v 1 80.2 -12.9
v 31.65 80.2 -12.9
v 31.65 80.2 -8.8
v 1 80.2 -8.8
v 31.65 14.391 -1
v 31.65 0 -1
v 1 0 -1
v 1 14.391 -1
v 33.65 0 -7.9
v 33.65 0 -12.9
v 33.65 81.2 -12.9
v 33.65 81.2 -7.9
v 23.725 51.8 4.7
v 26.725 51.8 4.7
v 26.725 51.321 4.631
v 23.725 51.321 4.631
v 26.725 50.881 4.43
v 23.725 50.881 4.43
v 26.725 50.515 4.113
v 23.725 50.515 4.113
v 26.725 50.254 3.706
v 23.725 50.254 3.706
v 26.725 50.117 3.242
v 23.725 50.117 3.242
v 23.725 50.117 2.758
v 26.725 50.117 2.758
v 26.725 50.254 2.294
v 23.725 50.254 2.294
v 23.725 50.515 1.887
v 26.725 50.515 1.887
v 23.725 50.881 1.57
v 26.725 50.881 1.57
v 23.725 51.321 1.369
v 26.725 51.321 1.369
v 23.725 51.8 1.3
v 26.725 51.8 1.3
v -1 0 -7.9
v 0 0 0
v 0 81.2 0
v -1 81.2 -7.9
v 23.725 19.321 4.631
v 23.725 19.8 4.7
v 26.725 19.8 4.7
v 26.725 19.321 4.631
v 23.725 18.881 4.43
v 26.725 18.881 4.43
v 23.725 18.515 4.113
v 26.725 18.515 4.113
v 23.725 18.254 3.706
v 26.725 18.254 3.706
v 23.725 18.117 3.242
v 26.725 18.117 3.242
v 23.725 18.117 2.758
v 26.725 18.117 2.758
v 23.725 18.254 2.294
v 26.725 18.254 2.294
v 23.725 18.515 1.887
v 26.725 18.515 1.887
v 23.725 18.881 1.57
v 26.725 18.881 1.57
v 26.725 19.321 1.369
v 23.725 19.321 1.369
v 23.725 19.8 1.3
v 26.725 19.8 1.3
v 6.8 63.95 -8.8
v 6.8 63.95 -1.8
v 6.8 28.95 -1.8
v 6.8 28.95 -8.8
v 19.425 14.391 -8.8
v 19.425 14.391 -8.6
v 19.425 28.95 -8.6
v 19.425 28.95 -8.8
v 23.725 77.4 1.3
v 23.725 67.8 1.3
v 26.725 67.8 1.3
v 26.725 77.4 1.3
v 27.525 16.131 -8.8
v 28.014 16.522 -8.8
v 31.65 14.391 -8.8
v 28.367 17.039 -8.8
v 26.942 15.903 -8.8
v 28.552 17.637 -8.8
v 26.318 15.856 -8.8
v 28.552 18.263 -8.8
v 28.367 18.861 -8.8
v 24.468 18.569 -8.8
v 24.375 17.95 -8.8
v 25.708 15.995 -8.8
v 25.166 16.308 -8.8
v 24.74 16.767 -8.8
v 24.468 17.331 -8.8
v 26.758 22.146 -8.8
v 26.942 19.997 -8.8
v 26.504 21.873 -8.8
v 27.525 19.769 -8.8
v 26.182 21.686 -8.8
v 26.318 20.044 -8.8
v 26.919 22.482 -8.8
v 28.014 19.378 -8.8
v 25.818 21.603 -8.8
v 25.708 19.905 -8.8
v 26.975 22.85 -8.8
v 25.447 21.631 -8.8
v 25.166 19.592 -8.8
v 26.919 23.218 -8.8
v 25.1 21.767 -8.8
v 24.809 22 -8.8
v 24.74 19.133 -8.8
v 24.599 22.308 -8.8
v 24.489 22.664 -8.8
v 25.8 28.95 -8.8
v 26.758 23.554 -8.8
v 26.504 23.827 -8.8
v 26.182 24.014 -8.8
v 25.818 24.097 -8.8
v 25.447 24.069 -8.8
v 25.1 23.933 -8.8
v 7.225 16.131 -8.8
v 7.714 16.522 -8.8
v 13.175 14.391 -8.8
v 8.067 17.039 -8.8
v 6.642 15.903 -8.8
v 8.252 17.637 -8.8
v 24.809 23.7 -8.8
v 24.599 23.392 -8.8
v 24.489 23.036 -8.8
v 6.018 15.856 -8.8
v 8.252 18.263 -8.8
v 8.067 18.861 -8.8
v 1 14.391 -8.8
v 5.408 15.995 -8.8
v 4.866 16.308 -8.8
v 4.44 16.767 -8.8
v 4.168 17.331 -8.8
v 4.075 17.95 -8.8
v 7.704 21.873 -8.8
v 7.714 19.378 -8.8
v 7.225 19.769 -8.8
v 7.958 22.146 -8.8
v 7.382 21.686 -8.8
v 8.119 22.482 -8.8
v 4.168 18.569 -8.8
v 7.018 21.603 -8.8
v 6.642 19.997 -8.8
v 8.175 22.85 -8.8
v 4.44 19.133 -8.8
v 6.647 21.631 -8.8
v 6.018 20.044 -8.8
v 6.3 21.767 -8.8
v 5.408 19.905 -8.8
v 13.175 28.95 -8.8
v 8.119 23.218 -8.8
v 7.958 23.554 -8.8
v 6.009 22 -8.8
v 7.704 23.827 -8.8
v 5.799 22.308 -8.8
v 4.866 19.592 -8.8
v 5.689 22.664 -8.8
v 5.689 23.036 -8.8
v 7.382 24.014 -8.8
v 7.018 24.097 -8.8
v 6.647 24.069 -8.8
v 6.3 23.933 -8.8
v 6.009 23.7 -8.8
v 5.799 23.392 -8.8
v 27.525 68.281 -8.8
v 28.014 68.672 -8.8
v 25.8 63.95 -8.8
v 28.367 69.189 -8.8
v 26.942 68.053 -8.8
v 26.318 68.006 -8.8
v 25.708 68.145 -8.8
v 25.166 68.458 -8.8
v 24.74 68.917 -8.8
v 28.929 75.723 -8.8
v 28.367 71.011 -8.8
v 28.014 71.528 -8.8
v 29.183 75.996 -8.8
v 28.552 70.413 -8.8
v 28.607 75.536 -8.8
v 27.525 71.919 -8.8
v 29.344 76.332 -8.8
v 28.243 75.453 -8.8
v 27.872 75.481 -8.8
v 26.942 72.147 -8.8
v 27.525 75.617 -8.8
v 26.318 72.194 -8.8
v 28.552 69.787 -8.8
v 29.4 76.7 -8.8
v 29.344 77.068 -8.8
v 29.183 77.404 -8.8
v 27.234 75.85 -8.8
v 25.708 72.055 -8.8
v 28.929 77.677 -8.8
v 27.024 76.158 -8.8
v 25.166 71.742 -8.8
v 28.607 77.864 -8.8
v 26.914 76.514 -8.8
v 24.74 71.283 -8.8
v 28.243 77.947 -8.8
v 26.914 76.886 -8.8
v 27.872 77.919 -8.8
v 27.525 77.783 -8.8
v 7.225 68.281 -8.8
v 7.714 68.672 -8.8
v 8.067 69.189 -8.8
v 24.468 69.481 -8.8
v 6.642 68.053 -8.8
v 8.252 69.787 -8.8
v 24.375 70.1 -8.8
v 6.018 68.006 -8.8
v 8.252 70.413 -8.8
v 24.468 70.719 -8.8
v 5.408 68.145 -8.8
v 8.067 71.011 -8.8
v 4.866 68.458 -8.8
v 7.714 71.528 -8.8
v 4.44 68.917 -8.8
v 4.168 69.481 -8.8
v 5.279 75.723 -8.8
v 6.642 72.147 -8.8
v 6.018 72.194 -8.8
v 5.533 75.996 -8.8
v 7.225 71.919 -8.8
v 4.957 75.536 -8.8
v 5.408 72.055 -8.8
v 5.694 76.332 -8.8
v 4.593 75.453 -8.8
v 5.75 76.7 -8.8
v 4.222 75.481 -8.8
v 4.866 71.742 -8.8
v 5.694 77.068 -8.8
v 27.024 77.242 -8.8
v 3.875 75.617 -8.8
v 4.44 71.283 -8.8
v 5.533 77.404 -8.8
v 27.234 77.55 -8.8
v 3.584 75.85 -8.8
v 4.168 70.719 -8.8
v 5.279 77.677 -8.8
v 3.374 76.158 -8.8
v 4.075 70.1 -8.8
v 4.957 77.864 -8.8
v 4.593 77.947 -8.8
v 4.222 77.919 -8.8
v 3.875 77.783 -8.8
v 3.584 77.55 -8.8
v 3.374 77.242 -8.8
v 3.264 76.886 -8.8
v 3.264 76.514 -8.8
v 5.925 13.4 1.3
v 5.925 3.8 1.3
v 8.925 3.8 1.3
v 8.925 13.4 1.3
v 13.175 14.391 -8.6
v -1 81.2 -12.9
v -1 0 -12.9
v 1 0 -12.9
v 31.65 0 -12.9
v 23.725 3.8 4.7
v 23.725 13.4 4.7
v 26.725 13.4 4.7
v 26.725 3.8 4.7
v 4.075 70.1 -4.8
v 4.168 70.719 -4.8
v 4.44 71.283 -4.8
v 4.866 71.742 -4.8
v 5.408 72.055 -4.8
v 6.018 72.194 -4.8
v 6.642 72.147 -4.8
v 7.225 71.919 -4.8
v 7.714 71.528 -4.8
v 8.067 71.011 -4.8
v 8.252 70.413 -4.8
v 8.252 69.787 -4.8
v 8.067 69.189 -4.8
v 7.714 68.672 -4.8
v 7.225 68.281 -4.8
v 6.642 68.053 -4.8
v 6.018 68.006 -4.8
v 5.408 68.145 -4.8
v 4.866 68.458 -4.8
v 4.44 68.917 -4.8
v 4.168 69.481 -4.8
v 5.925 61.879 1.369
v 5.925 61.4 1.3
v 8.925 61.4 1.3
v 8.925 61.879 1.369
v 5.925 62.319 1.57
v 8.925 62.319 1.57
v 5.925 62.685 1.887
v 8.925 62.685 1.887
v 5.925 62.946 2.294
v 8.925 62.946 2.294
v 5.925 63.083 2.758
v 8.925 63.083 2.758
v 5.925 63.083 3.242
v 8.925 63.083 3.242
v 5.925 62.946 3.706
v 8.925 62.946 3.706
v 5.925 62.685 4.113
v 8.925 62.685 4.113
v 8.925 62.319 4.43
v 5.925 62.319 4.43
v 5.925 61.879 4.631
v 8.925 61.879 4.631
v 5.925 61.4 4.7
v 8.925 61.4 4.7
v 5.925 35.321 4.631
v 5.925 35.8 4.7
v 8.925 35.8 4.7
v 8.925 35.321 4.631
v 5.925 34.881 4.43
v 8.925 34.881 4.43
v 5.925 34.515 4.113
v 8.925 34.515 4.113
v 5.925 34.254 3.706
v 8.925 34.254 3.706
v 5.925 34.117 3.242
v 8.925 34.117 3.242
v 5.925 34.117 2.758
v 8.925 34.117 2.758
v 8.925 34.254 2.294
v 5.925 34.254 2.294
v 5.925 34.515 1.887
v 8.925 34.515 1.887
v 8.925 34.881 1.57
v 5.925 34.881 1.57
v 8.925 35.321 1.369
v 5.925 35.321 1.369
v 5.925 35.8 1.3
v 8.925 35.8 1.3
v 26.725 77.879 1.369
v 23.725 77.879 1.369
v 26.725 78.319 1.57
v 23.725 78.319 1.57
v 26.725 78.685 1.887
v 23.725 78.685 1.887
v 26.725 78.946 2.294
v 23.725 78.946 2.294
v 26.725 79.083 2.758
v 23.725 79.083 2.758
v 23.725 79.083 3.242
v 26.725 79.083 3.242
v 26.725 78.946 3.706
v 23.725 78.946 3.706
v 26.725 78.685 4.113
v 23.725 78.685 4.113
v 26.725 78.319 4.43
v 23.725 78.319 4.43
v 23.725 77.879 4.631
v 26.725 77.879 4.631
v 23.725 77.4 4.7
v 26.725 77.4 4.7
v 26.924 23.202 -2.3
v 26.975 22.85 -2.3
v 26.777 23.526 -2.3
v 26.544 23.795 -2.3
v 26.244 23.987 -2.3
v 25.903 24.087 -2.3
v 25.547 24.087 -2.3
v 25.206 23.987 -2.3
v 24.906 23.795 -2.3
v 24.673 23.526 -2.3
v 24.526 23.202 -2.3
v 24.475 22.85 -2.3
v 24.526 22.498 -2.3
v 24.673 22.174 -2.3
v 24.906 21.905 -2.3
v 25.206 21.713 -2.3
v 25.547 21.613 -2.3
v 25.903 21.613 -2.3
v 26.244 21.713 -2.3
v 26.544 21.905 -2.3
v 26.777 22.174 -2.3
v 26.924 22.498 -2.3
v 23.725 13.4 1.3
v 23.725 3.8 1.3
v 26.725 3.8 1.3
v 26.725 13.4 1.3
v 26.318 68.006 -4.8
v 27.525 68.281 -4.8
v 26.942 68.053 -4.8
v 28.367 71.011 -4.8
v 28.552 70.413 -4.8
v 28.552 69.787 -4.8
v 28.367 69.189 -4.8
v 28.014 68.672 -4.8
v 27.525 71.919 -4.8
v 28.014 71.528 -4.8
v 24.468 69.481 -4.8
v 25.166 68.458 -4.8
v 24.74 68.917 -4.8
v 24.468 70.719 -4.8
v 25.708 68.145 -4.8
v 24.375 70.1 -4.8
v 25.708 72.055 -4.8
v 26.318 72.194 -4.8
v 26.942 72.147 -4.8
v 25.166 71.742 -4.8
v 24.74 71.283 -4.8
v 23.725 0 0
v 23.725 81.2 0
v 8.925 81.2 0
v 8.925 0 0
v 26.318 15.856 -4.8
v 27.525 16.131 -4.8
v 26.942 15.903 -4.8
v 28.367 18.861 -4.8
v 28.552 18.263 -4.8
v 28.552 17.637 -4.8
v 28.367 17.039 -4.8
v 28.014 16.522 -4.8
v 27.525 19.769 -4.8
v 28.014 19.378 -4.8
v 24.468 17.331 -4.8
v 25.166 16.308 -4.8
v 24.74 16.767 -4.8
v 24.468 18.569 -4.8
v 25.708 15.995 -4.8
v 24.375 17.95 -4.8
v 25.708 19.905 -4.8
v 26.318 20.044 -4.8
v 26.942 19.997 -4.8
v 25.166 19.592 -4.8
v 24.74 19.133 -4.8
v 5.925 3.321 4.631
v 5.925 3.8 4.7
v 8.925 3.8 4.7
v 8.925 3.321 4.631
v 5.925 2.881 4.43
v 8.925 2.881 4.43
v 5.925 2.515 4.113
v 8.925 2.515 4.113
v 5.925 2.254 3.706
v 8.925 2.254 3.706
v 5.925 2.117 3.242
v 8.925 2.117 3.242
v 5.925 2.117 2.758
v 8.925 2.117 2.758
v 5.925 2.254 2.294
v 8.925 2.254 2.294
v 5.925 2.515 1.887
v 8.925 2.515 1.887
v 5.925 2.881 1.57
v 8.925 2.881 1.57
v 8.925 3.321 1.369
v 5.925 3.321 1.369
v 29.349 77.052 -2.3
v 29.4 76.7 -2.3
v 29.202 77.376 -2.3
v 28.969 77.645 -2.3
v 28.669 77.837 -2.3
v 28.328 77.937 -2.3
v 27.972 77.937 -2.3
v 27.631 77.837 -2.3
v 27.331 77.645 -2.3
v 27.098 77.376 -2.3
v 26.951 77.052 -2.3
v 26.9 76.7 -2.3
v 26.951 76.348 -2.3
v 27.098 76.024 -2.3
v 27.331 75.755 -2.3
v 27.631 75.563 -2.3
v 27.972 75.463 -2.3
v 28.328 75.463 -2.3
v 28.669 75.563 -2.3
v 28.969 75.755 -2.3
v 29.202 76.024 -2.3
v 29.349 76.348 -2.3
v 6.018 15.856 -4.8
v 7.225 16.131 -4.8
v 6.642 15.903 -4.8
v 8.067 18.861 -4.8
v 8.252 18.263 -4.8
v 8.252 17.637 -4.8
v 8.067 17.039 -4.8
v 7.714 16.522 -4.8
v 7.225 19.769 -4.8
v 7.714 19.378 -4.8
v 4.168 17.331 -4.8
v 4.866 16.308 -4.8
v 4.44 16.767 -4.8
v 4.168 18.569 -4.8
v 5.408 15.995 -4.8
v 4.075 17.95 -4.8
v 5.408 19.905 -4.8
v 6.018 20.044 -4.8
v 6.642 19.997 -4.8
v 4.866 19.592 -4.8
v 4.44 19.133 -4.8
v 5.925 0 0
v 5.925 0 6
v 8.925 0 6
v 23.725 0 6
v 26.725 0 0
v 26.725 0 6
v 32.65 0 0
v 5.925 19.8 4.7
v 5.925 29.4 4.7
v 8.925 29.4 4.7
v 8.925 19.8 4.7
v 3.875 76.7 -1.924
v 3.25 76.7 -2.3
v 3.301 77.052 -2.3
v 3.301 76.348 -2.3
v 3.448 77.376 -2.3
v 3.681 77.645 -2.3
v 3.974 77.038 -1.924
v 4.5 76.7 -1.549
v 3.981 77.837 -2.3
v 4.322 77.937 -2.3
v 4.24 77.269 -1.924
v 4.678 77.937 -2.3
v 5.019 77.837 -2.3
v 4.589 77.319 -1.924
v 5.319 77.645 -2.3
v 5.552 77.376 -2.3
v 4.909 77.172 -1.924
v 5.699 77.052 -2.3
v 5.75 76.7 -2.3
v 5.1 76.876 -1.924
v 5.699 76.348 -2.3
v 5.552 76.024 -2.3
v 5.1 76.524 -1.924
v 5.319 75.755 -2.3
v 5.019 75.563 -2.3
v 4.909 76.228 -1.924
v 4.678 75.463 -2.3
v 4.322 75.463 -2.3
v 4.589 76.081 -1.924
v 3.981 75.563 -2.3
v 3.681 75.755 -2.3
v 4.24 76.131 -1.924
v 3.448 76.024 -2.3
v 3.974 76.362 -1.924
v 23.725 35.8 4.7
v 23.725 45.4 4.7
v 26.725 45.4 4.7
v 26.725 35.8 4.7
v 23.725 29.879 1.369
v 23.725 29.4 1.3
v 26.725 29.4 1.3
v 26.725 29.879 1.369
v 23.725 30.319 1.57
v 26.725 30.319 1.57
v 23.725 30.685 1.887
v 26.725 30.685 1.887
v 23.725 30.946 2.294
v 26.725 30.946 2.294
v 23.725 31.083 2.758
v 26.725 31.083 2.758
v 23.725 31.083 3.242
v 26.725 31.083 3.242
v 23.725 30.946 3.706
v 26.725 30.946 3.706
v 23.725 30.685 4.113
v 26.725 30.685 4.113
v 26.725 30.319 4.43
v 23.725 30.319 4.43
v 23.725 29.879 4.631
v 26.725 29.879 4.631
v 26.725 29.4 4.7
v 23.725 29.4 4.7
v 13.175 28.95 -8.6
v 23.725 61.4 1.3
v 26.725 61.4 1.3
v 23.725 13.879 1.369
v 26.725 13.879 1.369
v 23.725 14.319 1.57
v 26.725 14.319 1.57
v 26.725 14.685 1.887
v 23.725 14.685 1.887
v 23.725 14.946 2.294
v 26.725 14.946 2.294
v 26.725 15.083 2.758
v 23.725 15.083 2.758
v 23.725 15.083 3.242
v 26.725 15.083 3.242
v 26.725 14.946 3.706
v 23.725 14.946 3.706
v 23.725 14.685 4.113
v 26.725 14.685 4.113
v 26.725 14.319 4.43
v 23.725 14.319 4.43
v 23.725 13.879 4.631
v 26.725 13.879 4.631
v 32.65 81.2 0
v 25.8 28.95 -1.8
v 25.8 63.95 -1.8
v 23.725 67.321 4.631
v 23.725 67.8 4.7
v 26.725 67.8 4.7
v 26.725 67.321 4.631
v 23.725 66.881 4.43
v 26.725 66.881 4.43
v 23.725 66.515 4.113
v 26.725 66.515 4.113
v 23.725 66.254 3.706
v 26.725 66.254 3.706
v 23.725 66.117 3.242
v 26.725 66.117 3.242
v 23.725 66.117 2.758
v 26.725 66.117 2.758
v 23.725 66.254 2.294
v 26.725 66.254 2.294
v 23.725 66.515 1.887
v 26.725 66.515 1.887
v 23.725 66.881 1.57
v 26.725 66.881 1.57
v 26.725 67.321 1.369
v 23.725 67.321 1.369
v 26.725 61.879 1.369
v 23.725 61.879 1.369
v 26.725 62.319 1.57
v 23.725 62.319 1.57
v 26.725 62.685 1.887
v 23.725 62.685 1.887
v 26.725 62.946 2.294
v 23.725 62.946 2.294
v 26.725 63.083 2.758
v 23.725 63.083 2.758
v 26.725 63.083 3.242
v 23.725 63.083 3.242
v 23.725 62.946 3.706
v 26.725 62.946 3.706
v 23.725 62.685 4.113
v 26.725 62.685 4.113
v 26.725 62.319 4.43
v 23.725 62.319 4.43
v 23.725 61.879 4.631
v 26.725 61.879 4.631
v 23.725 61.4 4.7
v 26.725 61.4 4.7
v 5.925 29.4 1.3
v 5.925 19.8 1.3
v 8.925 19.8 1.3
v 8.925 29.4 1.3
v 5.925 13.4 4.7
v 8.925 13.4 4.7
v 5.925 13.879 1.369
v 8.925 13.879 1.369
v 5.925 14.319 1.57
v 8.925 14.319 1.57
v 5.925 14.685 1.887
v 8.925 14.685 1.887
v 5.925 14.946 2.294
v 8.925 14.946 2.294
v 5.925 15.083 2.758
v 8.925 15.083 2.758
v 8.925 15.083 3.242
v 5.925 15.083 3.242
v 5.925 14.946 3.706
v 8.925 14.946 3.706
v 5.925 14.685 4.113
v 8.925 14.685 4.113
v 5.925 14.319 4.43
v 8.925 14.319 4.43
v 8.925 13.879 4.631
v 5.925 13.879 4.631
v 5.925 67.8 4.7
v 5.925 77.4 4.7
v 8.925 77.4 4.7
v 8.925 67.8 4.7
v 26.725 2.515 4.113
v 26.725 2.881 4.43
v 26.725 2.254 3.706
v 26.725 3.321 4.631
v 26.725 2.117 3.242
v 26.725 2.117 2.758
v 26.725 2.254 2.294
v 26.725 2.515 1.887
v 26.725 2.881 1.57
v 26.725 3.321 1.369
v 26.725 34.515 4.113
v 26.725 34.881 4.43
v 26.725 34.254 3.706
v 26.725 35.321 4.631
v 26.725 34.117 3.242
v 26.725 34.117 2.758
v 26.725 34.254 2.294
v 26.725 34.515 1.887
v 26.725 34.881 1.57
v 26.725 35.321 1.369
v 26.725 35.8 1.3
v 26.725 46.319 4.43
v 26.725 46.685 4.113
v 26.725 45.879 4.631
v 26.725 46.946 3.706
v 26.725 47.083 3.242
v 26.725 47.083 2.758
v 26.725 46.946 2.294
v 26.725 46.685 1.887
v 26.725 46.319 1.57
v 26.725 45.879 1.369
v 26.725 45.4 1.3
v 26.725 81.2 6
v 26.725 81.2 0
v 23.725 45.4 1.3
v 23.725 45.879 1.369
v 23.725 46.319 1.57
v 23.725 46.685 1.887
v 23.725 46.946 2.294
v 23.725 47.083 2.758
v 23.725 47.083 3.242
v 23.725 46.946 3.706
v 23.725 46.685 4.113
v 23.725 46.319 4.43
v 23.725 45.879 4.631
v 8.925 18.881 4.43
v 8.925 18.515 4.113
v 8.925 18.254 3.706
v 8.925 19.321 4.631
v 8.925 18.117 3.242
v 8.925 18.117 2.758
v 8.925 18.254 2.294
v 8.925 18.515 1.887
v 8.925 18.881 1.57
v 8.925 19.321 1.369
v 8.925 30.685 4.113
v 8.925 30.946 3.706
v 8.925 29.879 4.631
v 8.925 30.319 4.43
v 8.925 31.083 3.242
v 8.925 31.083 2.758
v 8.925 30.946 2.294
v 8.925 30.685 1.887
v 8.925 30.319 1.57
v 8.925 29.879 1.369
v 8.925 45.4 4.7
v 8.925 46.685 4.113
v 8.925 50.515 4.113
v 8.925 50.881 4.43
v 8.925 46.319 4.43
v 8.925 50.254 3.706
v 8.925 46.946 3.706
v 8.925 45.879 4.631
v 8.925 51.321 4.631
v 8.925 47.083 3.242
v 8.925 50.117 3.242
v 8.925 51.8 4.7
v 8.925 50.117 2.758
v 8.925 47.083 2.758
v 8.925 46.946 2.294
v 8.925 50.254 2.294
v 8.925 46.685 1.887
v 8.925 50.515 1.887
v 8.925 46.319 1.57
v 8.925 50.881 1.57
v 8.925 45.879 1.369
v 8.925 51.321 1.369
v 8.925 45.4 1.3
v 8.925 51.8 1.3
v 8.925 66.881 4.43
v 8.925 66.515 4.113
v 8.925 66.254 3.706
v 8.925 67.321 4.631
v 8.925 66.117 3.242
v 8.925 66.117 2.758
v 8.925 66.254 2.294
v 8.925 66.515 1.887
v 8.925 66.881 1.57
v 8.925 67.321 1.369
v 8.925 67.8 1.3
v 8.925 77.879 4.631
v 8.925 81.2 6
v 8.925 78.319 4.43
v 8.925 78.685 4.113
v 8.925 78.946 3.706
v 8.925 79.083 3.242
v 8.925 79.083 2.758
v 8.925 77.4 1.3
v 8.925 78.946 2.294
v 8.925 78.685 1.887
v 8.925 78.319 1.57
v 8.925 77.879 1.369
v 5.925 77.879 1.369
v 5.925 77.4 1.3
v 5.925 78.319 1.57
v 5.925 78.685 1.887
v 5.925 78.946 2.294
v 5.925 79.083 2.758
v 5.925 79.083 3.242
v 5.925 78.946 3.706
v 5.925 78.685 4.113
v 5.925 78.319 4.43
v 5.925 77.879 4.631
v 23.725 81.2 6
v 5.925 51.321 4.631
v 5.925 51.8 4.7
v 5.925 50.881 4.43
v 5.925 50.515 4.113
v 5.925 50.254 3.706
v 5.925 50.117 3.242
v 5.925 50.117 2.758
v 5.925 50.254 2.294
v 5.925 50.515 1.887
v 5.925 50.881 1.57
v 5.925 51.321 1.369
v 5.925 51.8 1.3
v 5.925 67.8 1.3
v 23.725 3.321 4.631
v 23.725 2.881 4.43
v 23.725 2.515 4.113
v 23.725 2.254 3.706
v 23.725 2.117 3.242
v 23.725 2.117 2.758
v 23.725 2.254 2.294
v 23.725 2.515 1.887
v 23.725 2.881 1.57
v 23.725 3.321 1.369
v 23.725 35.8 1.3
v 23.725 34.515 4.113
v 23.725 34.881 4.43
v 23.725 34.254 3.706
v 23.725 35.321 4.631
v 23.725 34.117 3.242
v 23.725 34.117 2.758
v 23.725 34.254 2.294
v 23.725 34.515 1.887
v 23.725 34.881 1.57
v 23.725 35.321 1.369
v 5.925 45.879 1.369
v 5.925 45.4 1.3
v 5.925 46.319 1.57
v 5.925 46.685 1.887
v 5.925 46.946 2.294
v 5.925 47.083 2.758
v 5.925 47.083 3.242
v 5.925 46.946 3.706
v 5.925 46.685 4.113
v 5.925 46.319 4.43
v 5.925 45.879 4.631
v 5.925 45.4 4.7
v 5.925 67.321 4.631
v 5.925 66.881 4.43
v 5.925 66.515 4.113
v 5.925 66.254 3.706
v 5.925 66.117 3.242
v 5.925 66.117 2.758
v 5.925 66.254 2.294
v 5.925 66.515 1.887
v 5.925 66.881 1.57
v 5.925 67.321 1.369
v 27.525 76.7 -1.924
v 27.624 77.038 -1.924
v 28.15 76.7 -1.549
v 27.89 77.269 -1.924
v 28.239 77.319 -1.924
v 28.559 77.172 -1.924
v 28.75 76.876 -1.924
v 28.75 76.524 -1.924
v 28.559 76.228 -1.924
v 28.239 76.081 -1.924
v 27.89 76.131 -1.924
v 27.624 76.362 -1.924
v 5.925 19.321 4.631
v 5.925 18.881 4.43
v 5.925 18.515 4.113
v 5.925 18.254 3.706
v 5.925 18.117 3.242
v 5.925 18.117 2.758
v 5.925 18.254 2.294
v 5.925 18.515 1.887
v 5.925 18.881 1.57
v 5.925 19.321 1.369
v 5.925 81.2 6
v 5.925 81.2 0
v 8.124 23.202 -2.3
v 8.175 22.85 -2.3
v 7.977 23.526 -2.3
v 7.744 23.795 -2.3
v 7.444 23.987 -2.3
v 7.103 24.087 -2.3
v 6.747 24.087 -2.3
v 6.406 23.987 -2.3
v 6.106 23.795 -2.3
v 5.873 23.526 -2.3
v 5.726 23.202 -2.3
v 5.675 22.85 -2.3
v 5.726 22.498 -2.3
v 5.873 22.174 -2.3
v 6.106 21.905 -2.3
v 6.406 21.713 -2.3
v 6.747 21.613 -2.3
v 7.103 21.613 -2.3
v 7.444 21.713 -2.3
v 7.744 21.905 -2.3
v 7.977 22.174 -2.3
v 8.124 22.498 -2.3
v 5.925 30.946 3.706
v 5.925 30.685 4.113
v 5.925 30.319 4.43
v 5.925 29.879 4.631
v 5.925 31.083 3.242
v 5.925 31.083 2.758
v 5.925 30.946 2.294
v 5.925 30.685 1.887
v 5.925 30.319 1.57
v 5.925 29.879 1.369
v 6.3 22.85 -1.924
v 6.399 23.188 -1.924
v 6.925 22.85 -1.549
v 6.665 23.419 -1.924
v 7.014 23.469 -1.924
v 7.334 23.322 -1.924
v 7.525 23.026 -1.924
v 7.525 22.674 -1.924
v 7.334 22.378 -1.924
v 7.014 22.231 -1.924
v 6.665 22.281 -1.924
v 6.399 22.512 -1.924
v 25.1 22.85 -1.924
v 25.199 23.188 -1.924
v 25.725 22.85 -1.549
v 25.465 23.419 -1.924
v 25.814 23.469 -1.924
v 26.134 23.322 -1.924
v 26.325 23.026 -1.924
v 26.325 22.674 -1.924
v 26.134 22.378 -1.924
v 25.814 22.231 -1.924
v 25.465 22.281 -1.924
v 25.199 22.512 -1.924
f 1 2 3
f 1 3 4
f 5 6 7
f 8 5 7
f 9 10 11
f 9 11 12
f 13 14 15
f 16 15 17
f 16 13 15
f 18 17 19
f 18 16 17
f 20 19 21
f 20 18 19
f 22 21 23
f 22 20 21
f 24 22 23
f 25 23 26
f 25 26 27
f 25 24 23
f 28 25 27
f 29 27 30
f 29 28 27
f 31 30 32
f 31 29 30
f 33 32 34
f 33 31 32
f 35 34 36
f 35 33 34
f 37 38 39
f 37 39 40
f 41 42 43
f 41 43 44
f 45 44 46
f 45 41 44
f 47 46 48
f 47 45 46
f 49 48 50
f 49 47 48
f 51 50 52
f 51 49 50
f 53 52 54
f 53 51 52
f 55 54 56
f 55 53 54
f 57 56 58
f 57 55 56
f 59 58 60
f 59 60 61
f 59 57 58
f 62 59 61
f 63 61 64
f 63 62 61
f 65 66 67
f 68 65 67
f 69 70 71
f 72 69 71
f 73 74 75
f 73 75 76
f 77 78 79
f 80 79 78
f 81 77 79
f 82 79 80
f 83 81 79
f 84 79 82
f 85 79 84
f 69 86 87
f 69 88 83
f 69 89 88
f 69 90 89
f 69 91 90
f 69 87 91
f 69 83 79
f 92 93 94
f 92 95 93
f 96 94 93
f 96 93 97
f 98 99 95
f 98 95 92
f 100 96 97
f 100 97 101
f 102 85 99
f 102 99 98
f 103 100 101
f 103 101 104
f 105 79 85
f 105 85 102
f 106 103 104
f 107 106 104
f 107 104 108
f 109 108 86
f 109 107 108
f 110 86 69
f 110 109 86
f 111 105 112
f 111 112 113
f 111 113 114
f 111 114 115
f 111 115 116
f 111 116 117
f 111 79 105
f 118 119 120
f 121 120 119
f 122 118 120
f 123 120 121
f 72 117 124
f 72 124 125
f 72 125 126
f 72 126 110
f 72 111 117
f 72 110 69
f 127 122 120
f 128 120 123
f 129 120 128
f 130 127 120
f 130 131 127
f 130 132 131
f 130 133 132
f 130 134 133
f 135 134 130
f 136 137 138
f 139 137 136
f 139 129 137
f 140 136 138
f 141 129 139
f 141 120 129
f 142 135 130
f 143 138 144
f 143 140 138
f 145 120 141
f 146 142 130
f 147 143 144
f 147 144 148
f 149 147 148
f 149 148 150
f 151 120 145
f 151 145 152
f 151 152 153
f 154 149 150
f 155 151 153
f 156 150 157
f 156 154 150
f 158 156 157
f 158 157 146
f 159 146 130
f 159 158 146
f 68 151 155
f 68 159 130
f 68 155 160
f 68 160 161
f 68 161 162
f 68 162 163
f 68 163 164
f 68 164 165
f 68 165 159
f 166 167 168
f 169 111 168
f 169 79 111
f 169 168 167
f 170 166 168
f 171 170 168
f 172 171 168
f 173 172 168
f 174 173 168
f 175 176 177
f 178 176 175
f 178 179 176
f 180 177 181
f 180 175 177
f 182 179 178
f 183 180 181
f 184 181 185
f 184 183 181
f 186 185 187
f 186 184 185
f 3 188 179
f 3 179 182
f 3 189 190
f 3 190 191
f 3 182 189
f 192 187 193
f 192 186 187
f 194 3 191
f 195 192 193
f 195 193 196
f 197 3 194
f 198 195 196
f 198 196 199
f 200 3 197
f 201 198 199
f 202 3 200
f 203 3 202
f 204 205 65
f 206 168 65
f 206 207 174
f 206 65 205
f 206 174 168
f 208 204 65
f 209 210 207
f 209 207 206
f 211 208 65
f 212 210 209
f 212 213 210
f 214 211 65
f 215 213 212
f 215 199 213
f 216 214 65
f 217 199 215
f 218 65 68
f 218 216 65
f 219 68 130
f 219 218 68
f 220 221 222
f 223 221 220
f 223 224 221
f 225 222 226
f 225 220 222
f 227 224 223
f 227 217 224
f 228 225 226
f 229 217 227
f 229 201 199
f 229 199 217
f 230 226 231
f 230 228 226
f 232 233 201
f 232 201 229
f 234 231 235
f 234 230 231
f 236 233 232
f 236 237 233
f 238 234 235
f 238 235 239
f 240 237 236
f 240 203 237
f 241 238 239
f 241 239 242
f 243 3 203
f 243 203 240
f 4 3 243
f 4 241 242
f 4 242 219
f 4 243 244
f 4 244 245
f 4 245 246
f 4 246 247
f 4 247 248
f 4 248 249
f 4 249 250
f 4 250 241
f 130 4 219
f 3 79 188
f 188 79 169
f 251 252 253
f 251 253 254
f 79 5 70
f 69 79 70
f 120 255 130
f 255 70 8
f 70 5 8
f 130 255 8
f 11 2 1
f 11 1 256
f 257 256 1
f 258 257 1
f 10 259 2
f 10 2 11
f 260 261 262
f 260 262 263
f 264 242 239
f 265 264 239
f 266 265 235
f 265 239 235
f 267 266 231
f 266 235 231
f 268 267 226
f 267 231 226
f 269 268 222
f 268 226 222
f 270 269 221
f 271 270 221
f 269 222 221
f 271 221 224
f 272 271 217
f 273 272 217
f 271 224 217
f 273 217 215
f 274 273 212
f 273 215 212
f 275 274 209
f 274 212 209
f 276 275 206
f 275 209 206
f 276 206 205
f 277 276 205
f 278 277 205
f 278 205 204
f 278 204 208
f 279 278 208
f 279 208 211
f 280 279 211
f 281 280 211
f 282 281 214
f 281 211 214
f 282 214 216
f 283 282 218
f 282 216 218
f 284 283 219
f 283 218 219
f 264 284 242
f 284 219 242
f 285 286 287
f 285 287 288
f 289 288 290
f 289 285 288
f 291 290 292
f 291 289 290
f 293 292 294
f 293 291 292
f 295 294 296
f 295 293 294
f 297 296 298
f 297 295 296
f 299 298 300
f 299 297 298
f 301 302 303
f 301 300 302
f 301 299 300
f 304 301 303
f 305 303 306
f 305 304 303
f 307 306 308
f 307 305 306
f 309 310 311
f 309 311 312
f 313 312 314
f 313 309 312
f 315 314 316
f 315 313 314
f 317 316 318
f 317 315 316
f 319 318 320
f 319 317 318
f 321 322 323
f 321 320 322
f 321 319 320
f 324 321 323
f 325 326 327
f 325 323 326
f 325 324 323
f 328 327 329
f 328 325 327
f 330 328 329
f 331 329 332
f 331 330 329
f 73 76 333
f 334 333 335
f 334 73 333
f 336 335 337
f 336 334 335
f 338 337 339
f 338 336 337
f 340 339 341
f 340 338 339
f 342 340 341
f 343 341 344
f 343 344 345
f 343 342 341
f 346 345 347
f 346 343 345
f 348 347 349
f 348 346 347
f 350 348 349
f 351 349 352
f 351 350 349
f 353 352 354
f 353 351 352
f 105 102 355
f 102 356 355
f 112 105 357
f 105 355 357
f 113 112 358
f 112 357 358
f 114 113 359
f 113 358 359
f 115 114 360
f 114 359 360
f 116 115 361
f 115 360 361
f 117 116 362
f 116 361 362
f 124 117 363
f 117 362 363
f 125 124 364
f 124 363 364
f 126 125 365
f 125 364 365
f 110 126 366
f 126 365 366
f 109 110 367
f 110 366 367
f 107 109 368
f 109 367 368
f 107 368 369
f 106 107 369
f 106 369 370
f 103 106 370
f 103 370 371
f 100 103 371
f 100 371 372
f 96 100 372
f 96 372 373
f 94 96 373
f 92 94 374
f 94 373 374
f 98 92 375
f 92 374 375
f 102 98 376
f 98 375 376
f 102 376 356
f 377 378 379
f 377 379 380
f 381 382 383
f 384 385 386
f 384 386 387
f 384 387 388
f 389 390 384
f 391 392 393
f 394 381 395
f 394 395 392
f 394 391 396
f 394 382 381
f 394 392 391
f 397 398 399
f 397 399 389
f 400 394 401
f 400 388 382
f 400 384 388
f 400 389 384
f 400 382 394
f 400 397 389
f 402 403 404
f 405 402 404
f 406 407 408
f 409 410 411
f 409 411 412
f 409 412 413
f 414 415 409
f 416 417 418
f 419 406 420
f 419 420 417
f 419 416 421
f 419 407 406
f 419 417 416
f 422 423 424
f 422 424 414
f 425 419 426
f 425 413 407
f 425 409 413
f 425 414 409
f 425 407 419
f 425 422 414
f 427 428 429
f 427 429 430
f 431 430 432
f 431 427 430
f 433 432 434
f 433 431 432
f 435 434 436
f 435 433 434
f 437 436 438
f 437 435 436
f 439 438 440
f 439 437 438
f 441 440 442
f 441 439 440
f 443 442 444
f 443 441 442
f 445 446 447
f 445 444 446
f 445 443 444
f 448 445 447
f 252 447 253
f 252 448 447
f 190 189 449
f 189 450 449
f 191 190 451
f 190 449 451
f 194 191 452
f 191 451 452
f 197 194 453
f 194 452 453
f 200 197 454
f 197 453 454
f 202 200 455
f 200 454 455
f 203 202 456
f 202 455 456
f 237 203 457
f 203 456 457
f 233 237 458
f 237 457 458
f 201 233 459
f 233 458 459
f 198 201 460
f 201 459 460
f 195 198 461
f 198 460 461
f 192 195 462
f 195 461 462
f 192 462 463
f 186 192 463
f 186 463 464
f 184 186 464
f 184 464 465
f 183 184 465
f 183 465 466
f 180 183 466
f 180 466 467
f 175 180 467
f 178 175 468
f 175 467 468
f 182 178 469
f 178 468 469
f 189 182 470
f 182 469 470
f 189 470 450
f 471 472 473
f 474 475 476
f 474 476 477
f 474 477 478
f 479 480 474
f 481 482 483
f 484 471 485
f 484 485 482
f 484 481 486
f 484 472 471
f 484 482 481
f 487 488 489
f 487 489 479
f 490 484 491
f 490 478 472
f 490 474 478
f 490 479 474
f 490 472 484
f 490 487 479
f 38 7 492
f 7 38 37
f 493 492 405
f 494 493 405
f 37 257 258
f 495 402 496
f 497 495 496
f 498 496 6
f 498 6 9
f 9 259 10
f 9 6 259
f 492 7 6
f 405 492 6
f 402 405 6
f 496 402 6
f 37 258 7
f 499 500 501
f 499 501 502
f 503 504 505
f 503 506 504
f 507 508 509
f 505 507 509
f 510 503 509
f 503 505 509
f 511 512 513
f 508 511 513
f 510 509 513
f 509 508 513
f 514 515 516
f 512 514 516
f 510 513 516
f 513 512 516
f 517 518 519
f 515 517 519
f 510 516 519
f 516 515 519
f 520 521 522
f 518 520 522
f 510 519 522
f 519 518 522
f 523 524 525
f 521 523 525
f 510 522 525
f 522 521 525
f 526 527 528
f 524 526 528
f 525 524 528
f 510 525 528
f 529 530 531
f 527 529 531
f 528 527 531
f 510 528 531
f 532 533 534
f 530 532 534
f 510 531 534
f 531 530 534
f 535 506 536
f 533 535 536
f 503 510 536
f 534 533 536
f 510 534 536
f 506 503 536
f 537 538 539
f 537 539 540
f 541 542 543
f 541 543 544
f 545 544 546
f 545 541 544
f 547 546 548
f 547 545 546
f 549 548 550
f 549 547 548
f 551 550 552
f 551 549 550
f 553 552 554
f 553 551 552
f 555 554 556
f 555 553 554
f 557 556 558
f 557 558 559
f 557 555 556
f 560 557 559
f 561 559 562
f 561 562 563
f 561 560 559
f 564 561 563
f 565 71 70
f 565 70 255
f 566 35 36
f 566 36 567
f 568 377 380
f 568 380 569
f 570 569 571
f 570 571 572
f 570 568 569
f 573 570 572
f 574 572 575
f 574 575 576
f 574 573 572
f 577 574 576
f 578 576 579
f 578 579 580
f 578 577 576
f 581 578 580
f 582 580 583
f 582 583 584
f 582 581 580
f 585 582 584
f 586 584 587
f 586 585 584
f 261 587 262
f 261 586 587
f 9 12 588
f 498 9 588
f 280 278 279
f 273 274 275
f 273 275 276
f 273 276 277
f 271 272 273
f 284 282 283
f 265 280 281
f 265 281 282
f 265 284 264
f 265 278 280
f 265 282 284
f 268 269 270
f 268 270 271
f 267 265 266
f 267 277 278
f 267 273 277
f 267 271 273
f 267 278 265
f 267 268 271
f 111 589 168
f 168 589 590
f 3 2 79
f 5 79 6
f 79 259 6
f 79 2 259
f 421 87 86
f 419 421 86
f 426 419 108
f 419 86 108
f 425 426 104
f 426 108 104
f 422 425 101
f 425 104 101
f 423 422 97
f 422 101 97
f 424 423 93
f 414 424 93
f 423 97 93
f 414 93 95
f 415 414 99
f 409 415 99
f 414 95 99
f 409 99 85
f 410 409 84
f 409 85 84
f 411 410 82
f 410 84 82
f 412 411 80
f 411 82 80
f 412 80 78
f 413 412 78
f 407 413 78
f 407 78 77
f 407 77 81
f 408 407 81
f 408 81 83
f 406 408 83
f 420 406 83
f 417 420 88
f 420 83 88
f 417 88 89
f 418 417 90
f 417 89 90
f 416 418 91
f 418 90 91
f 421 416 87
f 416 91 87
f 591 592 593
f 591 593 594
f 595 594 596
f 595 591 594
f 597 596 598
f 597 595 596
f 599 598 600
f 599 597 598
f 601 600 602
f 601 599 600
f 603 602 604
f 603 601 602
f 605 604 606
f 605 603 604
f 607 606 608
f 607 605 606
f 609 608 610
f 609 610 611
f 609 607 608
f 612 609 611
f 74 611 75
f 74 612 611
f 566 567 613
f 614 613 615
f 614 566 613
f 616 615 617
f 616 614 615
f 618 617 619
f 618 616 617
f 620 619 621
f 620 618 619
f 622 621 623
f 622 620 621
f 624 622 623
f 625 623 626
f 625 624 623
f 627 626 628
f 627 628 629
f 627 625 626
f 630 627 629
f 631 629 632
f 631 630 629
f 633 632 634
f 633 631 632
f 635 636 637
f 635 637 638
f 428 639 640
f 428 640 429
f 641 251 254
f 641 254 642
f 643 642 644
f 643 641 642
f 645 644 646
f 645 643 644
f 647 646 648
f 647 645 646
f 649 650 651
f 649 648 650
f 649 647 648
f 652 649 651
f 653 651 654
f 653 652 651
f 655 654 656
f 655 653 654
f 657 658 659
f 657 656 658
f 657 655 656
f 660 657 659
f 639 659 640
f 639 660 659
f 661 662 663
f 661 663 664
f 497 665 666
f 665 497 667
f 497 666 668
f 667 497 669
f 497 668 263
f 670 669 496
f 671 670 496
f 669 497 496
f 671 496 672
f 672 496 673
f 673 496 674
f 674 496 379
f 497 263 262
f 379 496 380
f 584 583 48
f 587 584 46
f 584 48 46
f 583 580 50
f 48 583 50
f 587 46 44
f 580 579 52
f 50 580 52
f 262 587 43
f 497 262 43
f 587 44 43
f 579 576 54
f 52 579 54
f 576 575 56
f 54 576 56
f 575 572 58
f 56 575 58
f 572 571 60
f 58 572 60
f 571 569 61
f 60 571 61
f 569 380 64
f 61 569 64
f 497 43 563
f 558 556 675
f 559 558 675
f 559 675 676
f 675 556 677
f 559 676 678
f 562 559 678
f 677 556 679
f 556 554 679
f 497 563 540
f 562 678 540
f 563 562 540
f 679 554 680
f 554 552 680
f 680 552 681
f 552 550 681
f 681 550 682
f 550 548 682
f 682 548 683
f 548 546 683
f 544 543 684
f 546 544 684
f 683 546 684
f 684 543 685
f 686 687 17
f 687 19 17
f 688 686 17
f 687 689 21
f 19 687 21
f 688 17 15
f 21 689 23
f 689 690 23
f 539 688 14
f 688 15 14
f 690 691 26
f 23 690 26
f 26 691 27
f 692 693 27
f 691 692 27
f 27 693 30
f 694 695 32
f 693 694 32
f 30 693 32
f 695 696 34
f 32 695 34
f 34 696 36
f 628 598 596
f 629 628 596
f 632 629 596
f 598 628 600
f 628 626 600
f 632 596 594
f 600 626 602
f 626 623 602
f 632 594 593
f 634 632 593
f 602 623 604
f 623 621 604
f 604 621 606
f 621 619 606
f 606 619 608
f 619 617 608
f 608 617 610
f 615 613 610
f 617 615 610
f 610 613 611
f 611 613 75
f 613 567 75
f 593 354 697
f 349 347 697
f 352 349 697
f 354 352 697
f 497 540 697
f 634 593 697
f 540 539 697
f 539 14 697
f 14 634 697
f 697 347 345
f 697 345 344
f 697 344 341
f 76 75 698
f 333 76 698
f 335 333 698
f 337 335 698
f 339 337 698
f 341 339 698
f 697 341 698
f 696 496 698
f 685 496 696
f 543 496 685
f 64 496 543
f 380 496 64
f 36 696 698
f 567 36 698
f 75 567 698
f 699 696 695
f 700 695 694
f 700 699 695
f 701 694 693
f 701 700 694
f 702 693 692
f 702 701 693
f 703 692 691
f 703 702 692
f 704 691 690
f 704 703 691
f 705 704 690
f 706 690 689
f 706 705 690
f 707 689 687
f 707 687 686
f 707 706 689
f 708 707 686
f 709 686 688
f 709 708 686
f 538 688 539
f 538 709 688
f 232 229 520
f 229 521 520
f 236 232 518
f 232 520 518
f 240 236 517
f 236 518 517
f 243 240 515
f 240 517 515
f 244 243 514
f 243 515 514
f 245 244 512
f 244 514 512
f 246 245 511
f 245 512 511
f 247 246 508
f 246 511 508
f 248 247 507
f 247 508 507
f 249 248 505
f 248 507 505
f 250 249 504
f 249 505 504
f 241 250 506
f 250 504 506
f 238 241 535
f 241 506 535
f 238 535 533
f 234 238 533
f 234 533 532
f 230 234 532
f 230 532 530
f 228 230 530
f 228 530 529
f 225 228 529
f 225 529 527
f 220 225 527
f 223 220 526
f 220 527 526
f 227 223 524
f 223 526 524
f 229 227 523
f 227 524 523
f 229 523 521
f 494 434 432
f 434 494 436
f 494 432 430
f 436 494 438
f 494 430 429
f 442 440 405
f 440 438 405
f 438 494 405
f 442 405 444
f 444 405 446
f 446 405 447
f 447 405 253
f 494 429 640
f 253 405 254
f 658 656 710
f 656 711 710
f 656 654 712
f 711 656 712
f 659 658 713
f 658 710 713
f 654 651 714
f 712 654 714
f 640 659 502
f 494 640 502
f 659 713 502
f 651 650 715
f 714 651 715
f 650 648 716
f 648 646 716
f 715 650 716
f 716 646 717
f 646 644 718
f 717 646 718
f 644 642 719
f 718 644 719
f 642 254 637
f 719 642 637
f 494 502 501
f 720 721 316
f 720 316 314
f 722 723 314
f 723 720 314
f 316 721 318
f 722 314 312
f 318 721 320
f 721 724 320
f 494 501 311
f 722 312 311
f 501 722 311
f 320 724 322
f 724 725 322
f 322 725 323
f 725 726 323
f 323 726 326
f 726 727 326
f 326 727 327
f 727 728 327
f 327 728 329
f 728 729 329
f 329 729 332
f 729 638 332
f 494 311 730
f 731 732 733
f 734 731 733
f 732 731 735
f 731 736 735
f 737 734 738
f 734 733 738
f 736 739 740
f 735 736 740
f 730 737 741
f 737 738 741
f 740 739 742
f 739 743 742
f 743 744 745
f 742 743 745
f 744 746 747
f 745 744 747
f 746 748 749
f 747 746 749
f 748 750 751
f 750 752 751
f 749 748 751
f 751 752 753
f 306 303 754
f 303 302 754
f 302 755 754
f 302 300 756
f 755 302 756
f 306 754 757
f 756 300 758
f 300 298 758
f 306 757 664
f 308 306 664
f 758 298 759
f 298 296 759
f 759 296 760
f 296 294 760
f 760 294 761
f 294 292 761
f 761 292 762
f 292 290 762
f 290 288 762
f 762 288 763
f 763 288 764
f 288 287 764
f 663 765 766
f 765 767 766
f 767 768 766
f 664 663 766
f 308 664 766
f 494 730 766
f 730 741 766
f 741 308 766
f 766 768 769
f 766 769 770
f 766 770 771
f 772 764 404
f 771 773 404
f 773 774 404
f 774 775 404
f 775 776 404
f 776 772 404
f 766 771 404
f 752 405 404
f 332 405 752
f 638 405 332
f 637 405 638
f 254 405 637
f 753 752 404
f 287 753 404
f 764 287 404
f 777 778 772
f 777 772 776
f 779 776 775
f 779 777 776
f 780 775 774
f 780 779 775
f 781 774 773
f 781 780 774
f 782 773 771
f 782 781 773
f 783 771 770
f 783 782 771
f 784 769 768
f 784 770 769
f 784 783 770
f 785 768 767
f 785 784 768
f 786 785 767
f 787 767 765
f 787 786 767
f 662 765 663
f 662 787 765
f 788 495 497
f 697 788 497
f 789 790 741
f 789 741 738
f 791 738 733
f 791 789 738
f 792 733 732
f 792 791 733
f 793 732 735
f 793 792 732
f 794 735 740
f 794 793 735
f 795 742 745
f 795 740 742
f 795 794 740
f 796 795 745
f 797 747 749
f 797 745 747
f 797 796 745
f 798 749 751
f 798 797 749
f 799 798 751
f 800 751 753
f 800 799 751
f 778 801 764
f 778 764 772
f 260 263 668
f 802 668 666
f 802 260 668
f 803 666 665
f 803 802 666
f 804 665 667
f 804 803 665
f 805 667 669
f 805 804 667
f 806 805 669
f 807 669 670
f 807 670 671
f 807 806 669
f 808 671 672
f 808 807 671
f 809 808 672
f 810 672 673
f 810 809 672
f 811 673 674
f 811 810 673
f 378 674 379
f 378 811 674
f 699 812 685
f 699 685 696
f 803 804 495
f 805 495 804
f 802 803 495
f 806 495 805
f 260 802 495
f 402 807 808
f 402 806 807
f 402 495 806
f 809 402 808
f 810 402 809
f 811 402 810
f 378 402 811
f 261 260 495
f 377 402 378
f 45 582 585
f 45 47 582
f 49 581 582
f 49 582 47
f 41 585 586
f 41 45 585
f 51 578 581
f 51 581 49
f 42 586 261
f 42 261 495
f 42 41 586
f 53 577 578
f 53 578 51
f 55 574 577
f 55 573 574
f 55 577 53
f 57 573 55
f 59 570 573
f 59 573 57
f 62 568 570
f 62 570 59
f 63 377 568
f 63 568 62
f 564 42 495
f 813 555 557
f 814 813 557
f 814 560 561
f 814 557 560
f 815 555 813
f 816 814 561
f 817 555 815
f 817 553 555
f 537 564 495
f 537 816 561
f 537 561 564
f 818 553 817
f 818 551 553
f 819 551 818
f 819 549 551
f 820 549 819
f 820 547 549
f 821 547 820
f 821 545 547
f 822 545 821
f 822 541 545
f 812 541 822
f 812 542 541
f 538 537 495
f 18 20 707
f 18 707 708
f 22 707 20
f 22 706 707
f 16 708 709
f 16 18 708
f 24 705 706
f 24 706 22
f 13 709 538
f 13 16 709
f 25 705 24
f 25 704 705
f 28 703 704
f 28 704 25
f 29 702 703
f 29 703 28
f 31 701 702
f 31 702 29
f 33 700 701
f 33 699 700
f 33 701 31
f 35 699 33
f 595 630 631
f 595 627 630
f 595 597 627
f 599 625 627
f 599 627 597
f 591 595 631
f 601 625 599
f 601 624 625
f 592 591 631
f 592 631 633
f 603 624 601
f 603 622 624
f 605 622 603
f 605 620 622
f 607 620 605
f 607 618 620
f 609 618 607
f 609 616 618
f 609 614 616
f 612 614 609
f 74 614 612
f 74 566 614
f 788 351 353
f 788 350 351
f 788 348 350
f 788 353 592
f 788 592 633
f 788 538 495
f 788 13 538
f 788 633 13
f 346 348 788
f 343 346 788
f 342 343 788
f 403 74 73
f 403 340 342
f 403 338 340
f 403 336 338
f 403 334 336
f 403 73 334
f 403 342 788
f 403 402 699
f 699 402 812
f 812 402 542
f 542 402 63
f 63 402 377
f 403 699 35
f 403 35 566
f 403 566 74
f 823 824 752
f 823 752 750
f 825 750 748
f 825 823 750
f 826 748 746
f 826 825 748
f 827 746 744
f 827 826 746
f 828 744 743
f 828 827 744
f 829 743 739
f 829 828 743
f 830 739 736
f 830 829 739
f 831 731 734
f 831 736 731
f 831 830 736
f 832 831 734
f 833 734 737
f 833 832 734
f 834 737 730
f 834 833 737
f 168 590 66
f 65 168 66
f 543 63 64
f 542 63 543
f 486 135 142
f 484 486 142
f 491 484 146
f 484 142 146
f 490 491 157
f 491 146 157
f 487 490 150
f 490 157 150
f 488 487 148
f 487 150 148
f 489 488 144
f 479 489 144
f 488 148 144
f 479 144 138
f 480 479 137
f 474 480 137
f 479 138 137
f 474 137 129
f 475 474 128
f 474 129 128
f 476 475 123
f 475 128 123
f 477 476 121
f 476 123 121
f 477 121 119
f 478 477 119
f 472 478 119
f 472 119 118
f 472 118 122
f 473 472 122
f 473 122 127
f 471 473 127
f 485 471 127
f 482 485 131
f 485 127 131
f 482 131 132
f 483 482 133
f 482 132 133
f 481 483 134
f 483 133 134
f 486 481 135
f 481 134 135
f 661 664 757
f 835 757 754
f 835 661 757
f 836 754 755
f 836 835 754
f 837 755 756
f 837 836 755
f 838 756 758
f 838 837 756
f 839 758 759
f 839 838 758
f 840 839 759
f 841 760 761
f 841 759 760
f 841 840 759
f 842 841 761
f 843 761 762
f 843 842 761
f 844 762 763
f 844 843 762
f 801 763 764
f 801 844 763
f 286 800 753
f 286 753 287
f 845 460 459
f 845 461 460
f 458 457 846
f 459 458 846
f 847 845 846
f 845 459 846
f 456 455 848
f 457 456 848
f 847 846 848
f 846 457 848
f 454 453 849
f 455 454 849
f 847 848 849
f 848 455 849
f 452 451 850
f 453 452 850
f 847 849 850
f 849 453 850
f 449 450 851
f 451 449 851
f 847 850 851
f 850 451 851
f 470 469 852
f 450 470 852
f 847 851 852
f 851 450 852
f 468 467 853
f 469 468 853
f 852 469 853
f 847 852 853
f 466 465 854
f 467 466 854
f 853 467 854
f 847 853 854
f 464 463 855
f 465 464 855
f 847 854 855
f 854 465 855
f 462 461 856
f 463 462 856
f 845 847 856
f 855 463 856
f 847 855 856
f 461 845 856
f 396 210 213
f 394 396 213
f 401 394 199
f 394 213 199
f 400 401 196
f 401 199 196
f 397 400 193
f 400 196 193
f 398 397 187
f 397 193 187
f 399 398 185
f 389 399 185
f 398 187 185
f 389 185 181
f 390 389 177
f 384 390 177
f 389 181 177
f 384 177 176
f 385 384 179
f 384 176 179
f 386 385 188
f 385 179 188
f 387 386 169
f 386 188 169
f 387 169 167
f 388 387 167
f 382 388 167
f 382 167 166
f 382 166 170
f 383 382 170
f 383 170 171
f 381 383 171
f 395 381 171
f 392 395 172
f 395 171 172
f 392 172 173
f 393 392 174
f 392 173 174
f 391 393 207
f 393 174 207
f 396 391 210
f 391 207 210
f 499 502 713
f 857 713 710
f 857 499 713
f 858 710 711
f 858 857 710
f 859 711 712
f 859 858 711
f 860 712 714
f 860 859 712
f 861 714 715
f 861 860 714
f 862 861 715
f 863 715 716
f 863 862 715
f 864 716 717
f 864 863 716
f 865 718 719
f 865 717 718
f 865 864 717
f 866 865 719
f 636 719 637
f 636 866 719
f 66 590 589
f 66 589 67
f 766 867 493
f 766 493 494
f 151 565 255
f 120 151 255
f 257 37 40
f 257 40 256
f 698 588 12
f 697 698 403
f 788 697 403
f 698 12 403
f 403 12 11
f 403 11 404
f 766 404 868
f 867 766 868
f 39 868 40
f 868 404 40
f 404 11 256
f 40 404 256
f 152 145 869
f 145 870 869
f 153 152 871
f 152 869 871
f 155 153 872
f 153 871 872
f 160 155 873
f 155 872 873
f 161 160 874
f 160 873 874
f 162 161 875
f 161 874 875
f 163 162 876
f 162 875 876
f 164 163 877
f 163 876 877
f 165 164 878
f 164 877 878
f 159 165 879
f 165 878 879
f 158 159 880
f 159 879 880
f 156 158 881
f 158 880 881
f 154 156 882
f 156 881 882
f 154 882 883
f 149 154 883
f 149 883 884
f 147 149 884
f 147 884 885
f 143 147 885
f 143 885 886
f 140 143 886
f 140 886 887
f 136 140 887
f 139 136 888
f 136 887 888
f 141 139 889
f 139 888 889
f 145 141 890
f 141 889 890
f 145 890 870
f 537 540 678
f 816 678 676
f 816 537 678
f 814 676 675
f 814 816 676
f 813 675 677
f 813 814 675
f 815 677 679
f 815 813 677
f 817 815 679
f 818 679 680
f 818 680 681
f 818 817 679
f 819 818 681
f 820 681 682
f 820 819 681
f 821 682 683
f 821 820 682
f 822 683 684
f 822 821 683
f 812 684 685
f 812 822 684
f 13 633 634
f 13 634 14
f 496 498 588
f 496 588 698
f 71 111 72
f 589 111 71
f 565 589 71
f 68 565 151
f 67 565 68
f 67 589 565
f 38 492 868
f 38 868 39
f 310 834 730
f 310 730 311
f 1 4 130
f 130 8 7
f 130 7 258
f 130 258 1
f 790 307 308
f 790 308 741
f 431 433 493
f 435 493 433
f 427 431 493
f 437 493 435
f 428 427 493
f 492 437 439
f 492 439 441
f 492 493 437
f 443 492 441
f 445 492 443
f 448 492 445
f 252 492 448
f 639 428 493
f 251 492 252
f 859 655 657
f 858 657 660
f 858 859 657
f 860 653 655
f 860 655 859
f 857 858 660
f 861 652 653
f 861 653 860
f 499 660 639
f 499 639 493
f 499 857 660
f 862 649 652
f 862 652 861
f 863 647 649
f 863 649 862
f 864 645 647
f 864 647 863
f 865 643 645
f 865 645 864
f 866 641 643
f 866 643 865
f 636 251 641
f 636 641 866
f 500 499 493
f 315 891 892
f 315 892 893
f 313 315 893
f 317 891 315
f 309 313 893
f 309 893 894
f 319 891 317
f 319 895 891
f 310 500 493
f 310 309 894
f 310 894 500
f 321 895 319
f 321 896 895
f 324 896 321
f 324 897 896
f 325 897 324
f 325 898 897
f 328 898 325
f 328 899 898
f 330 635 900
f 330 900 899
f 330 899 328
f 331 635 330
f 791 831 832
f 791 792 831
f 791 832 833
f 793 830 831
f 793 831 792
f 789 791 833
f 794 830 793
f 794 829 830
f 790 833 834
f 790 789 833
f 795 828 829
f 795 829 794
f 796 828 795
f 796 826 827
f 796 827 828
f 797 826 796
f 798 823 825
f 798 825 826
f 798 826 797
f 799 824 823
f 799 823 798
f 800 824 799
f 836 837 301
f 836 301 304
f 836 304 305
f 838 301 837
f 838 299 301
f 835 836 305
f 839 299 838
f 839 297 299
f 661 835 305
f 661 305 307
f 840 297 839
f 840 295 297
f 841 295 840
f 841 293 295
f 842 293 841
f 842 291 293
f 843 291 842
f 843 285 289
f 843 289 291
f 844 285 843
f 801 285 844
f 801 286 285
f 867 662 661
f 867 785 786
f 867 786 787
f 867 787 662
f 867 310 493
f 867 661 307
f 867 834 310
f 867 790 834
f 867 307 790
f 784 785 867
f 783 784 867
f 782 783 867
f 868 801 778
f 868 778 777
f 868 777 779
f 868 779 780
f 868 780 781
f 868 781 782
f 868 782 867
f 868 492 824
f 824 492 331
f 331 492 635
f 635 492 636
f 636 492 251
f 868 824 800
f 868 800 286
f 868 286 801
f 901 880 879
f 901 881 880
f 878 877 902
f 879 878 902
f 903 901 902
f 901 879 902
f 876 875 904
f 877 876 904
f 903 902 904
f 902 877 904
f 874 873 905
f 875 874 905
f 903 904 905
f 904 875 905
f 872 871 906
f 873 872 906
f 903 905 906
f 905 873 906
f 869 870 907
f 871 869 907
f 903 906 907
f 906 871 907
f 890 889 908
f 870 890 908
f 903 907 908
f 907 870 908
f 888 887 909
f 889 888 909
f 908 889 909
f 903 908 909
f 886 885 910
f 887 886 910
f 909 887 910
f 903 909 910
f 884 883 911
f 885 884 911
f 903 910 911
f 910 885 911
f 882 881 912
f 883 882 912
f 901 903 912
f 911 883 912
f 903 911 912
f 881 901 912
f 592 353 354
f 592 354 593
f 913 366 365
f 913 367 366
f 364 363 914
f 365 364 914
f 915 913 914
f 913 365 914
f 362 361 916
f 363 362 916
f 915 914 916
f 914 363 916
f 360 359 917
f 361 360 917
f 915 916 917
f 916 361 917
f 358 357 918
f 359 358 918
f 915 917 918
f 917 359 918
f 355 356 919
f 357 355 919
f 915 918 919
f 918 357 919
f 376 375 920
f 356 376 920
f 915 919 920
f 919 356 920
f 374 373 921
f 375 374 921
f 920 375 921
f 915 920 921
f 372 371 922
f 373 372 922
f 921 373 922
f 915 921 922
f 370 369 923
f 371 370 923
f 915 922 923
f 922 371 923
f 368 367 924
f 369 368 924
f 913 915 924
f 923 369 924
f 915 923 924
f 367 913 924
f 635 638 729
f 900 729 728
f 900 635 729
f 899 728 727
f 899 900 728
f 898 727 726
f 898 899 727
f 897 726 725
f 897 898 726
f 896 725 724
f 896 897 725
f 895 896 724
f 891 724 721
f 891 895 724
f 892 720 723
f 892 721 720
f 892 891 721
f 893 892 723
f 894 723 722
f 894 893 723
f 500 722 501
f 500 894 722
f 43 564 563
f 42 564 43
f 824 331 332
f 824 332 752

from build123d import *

# Parameters (mm, degrees)
BOSS_EXTRUDE1_DEPTH             = 80.2
BOSS_EXTRUDE2_DEPTH             = 1
SKETCH4_W                       = 3
SKETCH4_H                       = 81.2
BOSS_EXTRUDE3_DEPTH             = 6
M3_START                        = 5.925
M3_CLEARANCE_SLOT1_DEPTH        = 20.8
SKETCH24_W                      = 20.25
SKETCH24_H                      = 3
CUT_EXTRUDE5_DEPTH              = 1
BOSS_EXTRUDE7_DEPTH             = 7.8
SKETCH31_W                      = 34.65
SKETCH31_H                      = 3
CUT_EXTRUDE6_DEPTH              = 95
SKETCH34_W                      = 6.25
SKETCH34_H                      = 14.559328602
BOSS_EXTRUDE8_DEPTH             = 7.6
SKETCH35_R                      = 2.1
CUT_EXTRUDE7_DEPTH              = 4
SKETCH36_W                      = 19
SKETCH36_H                      = 35
BOSS_EXTRUDE9_DEPTH             = 0.8
TAP_DRILL_FOR_M3X0_5_TAP1_D     = 2.5
TAP_DRILL_FOR_M3X0_5_TAP1_DEPTH = 6.5
TAP_DRILL_FOR_M3X0_5_TAP1_TIP   = 0.751075774
TAP_DRILL_FOR_M3X0_5_TAP2_D     = 2.5
TAP_DRILL_FOR_M3X0_5_TAP2_DEPTH = 6.5
TAP_DRILL_FOR_M3X0_5_TAP2_TIP   = 0.751075774


# Read off the part's stored shape, not the designer's step: M3 Clearance Slot1
with BuildPart() as part:
    # Sketch1 → Boss-Extrude1 (new body)
    with BuildSketch(Plane(origin=(0, 0, 0), x_dir=(1, 0, 0), z_dir=(0, 1, 0))):
        Polygon((0, 0), (32.65, 0), (33.65, 7.9), (33.65, 15.9), (31.65, 15.9), (31.65, 1), (1, 1), (1, 15.9), (-1, 15.9), (-1, 7.9), align=None)
    extrude(amount=BOSS_EXTRUDE1_DEPTH)

    # Sketch2 → Boss-Extrude2 (add)
    with BuildSketch(Plane(origin=(0, 80.2, 0), x_dir=(1, 0, 0), z_dir=(0, 1, 0))):
        Polygon((32.65, 0), (0, 0), (-1, 7.9), (-1, 15.9), (33.65, 15.9), (33.65, 7.9), align=None)
    extrude(amount=BOSS_EXTRUDE2_DEPTH)

    # Sketch4 → Boss-Extrude3 (add)
    with BuildSketch(Plane.XY):
        with Locations((25.225, 40.6)):
            Rectangle(SKETCH4_W, SKETCH4_H)
        with Locations((7.425, 40.6)):
            Rectangle(SKETCH4_W, SKETCH4_H)
    extrude(amount=BOSS_EXTRUDE3_DEPTH)

    # M3 Clearance Slot1 outline → M3 Clearance Slot1 (cut)
    with BuildSketch(Plane.YZ.offset(M3_START)):
        with BuildLine():
            ThreePointArc((13.4, 1.3), (15.1, 3), (13.4, 4.7))
            Line((13.4, 4.7), (3.8, 4.7))
            ThreePointArc((3.8, 4.7), (2.1, 3), (3.8, 1.3))
            Line((3.8, 1.3), (13.4, 1.3))
        make_face()
        with BuildLine():
            ThreePointArc((19.8, 4.7), (18.1, 3), (19.8, 1.3))
            Line((19.8, 1.3), (29.4, 1.3))
            ThreePointArc((29.4, 1.3), (31.1, 3), (29.4, 4.7))
            Line((29.4, 4.7), (19.8, 4.7))
        make_face()
        with BuildLine():
            ThreePointArc((35.8, 4.7), (34.1, 3), (35.8, 1.3))
            Line((35.8, 1.3), (45.4, 1.3))
            ThreePointArc((45.4, 1.3), (47.1, 3), (45.4, 4.7))
            Line((45.4, 4.7), (35.8, 4.7))
        make_face()
        with BuildLine():
            ThreePointArc((51.8, 4.7), (50.1, 3), (51.8, 1.3))
            Line((51.8, 1.3), (61.4, 1.3))
            ThreePointArc((61.4, 1.3), (63.1, 3), (61.4, 4.7))
            Line((61.4, 4.7), (51.8, 4.7))
        make_face()
        with BuildLine():
            ThreePointArc((67.8, 4.7), (66.1, 3), (67.8, 1.3))
            Line((67.8, 1.3), (77.4, 1.3))
            ThreePointArc((77.4, 1.3), (79.1, 3), (77.4, 4.7))
            Line((77.4, 4.7), (67.8, 4.7))
        make_face()
    extrude(amount=M3_CLEARANCE_SLOT1_DEPTH, mode=Mode.SUBTRACT)

    # Sketch24 → Cut-Extrude5 (cut)
    with BuildSketch(Plane(origin=(0, 81.2, 0), x_dir=(1, 0, 0), z_dir=(0, 1, 0))):
        with Locations((16.325, 14.4)):
            Rectangle(SKETCH24_W, SKETCH24_H)
    extrude(amount=-CUT_EXTRUDE5_DEPTH, mode=Mode.SUBTRACT)

    # Sketch30 → Boss-Extrude7 (add)
    with BuildSketch(Plane(origin=(0, 0, -1), x_dir=(-1, 0, 0), z_dir=(0, 0, -1))):
        Polygon((-26.8, 27.95), (-19.425, 27.95), (-19.425, 28.95), (-25.8, 28.95), (-25.8, 63.95), (-6.8, 63.95), (-6.8, 28.95), (-13.175, 28.95), (-13.175, 27.95), (-5.8, 27.95), (-5.8, 64.95), (-26.8, 64.95), align=None)
        Polygon((-31.65, 80.2), (-31.65, 27.95), (-26.8, 27.95), (-26.8, 64.95), (-5.8, 64.95), (-5.8, 27.95), (-1, 27.95), (-1, 80.2), align=None)
        Polygon((-31.65, 27.95), (-31.65, 14.390671398), (-19.425, 14.390671398), (-19.425, 27.95), (-26.8, 27.95), align=None)
        Polygon((-13.175, 27.95), (-13.175, 14.390671398), (-1, 14.390671398), (-1, 27.95), (-5.8, 27.95), align=None)
    extrude(amount=BOSS_EXTRUDE7_DEPTH)

    # Sketch31 → Cut-Extrude6 (cut)
    with BuildSketch(Plane.XZ):
        with Locations((16.325, -14.4)):
            Rectangle(SKETCH31_W, SKETCH31_H)
    extrude(amount=-CUT_EXTRUDE6_DEPTH, mode=Mode.SUBTRACT)

    # Sketch34 → Boss-Extrude8 (add)
    with BuildSketch(Plane(origin=(0, 0, -1), x_dir=(-1, 0, 0), z_dir=(0, 0, -1))):
        with Locations((-16.3, 21.670335699)):
            Rectangle(SKETCH34_W, SKETCH34_H)
    extrude(amount=BOSS_EXTRUDE8_DEPTH)

    # Sketch35 → Cut-Extrude7 (cut)
    with BuildSketch(Plane(origin=(0, 0, -8.8), x_dir=(-1, 0, 0), z_dir=(0, 0, -1))):
        with Locations((-26.475, 70.1)):
            Circle(SKETCH35_R)
        with Locations((-6.175, 70.1)):
            Circle(SKETCH35_R)
        with Locations((-6.175, 17.95)):
            Circle(SKETCH35_R)
        with Locations((-26.475, 17.95)):
            Circle(SKETCH35_R)
    extrude(amount=-CUT_EXTRUDE7_DEPTH, mode=Mode.SUBTRACT)

    # Sketch36 → Boss-Extrude9 (add)
    with BuildSketch(Plane(origin=(0, 0, -1), x_dir=(-1, 0, 0), z_dir=(0, 0, -1))):
        with Locations((-16.3, 46.45)):
            Rectangle(SKETCH36_W, SKETCH36_H)
    extrude(amount=BOSS_EXTRUDE9_DEPTH)

    # Tap Drill for M3x0.5 Tap1
    with Locations(Plane(origin=(28.15, 76.7, -8.8), x_dir=(-1, 0, 0), z_dir=(0, 0, -1))):
        with Locations((0, 0), (23.65, 0)):
            Hole(TAP_DRILL_FOR_M3X0_5_TAP1_D / 2, depth=TAP_DRILL_FOR_M3X0_5_TAP1_DEPTH)
            with Locations((0, 0, -(TAP_DRILL_FOR_M3X0_5_TAP1_DEPTH + TAP_DRILL_FOR_M3X0_5_TAP1_TIP / 2))):  # 118° drill point
                Cone(0, TAP_DRILL_FOR_M3X0_5_TAP1_D / 2, TAP_DRILL_FOR_M3X0_5_TAP1_TIP, mode=Mode.SUBTRACT)

    # Tap Drill for M3x0.5 Tap2
    with Locations(Plane(origin=(25.725, 22.85, -8.8), x_dir=(-1, 0, 0), z_dir=(0, 0, -1))):
        with Locations((0, 0), (18.8, 0)):
            Hole(TAP_DRILL_FOR_M3X0_5_TAP2_D / 2, depth=TAP_DRILL_FOR_M3X0_5_TAP2_DEPTH)
            with Locations((0, 0, -(TAP_DRILL_FOR_M3X0_5_TAP2_DEPTH + TAP_DRILL_FOR_M3X0_5_TAP2_TIP / 2))):  # 118° drill point
                Cone(0, TAP_DRILL_FOR_M3X0_5_TAP2_D / 2, TAP_DRILL_FOR_M3X0_5_TAP2_TIP, mode=Mode.SUBTRACT)


solid = part.part
